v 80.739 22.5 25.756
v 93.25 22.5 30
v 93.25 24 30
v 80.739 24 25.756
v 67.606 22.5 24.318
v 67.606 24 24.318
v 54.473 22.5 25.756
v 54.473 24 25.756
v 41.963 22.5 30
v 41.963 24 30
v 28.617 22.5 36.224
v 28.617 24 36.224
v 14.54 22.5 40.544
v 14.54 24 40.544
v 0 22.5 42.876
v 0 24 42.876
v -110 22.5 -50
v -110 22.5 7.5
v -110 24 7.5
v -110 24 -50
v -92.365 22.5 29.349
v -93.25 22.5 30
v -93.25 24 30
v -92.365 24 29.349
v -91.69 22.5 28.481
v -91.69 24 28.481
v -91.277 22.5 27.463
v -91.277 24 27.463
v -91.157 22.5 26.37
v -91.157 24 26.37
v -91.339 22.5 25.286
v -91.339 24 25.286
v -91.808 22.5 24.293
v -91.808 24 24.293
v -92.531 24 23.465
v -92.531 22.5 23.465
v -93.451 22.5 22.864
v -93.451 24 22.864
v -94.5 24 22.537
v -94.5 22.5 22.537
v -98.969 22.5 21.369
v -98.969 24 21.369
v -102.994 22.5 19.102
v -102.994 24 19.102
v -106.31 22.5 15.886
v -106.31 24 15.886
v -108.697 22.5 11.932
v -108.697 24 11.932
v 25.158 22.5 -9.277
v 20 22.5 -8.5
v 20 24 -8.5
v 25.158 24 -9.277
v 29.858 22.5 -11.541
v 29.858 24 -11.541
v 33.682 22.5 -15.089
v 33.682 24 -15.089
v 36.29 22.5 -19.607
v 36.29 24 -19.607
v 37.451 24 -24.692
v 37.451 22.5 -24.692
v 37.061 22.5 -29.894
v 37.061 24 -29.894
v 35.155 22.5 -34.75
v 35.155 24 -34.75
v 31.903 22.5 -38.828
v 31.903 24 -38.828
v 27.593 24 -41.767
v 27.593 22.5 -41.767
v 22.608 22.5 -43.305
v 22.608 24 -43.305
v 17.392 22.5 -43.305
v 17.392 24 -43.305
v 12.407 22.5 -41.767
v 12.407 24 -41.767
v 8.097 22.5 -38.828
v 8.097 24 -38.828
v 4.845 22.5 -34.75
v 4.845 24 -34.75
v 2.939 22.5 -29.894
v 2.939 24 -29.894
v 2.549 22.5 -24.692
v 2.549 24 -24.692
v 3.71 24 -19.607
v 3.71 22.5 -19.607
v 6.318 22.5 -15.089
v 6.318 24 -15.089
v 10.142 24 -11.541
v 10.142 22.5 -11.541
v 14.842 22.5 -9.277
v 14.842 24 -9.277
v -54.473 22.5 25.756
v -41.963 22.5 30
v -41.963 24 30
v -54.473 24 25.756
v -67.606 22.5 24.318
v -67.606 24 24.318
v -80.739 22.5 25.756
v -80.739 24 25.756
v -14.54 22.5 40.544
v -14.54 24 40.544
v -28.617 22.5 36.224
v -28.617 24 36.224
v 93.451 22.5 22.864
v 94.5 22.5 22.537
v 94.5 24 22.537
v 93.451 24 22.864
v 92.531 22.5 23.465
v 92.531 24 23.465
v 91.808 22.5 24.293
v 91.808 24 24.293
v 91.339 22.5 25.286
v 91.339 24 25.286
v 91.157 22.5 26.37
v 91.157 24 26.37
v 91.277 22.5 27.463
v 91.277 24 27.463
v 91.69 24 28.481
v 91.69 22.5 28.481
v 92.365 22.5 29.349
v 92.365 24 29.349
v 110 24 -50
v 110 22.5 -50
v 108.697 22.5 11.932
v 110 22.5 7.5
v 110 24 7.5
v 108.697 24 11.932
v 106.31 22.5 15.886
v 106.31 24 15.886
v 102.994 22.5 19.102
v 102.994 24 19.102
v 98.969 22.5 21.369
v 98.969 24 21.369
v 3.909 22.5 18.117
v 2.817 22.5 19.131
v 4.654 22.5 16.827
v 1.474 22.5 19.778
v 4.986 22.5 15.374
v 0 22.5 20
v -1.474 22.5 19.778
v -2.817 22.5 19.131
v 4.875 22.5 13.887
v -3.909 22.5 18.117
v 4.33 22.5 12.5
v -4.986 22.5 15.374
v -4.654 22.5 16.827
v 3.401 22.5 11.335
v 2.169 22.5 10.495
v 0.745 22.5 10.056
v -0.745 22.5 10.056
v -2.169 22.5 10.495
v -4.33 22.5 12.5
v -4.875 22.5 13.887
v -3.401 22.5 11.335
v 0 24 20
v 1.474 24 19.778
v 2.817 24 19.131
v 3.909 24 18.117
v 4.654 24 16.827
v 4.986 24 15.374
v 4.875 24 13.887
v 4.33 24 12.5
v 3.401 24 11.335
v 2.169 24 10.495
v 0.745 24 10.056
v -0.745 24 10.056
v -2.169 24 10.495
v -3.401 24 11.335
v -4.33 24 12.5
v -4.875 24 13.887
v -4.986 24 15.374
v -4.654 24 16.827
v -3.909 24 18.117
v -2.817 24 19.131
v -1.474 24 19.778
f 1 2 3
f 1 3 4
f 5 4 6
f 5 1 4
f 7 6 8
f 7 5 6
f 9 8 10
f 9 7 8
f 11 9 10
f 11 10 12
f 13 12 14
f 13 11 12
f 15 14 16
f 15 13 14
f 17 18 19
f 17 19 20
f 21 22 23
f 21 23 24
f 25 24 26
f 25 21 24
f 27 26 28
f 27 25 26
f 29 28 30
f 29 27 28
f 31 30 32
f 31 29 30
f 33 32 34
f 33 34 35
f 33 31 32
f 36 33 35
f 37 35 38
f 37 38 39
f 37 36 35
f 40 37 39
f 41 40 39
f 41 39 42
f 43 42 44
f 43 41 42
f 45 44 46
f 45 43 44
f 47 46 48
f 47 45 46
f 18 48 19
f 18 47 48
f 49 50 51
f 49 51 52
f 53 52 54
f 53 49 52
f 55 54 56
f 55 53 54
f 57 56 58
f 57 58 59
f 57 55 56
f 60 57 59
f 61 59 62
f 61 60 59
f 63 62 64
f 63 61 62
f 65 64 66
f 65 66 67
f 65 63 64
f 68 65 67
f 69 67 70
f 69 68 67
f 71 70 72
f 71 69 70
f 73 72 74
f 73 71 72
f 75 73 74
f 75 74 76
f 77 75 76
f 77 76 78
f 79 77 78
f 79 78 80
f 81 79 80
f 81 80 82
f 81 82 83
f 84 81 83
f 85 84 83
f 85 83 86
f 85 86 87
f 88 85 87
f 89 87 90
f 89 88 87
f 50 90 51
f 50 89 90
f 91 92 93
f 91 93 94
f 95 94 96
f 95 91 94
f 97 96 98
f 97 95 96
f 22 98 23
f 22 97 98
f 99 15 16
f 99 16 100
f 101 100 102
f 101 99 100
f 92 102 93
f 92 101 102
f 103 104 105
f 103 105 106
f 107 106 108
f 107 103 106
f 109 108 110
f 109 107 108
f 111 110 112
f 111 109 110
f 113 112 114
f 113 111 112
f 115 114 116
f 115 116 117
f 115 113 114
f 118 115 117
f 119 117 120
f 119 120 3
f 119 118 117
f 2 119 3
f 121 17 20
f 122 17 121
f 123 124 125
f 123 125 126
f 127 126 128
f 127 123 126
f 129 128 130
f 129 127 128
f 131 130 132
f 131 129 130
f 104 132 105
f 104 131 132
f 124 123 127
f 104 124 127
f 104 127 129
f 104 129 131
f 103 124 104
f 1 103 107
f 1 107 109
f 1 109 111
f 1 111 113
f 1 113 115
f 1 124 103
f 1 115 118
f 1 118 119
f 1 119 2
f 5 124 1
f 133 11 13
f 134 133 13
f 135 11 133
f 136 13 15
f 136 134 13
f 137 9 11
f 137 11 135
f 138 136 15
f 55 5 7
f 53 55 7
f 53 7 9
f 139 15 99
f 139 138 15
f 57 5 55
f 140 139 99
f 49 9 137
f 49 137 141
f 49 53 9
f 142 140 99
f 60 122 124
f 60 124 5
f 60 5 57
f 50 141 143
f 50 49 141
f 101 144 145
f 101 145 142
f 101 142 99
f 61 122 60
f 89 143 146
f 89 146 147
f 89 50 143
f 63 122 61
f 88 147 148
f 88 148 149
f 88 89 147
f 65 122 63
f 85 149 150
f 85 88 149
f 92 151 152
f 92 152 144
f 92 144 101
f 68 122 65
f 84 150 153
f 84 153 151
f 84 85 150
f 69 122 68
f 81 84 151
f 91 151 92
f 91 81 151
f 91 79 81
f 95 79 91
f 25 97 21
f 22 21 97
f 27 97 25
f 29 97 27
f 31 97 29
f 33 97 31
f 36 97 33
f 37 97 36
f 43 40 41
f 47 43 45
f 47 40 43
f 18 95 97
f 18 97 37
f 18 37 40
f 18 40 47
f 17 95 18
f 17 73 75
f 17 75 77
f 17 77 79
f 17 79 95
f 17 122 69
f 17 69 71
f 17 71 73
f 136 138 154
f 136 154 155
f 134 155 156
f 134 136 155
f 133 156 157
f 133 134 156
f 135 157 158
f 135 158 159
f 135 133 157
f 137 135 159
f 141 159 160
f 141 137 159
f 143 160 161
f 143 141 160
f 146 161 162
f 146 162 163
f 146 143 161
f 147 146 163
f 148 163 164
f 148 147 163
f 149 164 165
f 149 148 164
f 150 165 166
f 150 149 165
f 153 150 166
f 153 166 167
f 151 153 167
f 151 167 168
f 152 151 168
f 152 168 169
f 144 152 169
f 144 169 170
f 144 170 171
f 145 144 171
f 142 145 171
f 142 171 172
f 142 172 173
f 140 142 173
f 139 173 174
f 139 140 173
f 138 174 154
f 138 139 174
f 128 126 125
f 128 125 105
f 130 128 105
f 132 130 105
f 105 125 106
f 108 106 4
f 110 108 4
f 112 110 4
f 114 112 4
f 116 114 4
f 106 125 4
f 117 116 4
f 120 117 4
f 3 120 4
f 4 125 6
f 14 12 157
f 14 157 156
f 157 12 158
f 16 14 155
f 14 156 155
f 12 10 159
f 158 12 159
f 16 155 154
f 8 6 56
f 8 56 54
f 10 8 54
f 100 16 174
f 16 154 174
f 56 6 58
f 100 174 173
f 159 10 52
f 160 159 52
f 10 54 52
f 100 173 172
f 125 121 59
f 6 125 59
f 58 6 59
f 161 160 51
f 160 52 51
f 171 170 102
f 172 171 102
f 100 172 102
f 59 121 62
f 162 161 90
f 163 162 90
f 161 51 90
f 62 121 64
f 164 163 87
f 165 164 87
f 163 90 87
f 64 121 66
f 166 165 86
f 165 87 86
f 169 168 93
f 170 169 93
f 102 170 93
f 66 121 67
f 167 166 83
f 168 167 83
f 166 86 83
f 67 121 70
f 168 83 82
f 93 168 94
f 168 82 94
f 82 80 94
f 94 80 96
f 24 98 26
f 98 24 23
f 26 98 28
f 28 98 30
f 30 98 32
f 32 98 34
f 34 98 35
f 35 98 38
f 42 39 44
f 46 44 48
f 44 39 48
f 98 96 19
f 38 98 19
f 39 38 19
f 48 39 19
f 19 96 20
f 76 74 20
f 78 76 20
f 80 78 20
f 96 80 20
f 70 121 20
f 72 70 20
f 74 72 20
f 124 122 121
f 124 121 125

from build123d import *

# Parameters (mm, degrees)
SKETCH2_R           = 17.5
SKETCH2_R_2         = 5
BOSS_EXTRUDE2_DEPTH = 1.5


with BuildPart() as part:
    # Sketch2 → Boss-Extrude2 (new body)
    with BuildSketch(Plane(origin=(0, 22.5, 0), x_dir=(1, 0, 0), z_dir=(0, 1, 0))):
        with BuildLine():
            Line((-110, 50), (110, 50))
            Line((110, 50), (110, -7.5))
            ThreePointArc((110, -7.5), (104.755451902, -17.601037804), (94.5, -22.536820999))
            ThreePointArc((94.5, -22.536820999), (91.210601206, -25.822153148), (93.25, -30))
            ThreePointArc((93.25, -30), (67.606257623, -24.318329423), (41.962515246, -30))
            ThreePointArc((41.962515246, -30), (21.653208784, -38.627914511), (0, -42.876136156))
            ThreePointArc((0, -42.876136156), (-21.653208784, -38.627914511), (-41.962515246, -30))
            ThreePointArc((-41.962515246, -30), (-67.606257623, -24.318329423), (-93.25, -30))
            ThreePointArc((-93.25, -30), (-91.210601206, -25.822153148), (-94.5, -22.536820999))
            ThreePointArc((-94.5, -22.536820999), (-104.755451902, -17.601037804), (-110, -7.5))
            Line((-110, -7.5), (-110, 50))
        make_face()
        with Locations(Location((20, 26, 0), (0, 0, 270))):
            Circle(SKETCH2_R, mode=Mode.SUBTRACT)
        with Locations(Location((0, -15, 0), (0, 0, 270))):
            Circle(SKETCH2_R_2, mode=Mode.SUBTRACT)
    extrude(amount=BOSS_EXTRUDE2_DEPTH)


solid = part.part
